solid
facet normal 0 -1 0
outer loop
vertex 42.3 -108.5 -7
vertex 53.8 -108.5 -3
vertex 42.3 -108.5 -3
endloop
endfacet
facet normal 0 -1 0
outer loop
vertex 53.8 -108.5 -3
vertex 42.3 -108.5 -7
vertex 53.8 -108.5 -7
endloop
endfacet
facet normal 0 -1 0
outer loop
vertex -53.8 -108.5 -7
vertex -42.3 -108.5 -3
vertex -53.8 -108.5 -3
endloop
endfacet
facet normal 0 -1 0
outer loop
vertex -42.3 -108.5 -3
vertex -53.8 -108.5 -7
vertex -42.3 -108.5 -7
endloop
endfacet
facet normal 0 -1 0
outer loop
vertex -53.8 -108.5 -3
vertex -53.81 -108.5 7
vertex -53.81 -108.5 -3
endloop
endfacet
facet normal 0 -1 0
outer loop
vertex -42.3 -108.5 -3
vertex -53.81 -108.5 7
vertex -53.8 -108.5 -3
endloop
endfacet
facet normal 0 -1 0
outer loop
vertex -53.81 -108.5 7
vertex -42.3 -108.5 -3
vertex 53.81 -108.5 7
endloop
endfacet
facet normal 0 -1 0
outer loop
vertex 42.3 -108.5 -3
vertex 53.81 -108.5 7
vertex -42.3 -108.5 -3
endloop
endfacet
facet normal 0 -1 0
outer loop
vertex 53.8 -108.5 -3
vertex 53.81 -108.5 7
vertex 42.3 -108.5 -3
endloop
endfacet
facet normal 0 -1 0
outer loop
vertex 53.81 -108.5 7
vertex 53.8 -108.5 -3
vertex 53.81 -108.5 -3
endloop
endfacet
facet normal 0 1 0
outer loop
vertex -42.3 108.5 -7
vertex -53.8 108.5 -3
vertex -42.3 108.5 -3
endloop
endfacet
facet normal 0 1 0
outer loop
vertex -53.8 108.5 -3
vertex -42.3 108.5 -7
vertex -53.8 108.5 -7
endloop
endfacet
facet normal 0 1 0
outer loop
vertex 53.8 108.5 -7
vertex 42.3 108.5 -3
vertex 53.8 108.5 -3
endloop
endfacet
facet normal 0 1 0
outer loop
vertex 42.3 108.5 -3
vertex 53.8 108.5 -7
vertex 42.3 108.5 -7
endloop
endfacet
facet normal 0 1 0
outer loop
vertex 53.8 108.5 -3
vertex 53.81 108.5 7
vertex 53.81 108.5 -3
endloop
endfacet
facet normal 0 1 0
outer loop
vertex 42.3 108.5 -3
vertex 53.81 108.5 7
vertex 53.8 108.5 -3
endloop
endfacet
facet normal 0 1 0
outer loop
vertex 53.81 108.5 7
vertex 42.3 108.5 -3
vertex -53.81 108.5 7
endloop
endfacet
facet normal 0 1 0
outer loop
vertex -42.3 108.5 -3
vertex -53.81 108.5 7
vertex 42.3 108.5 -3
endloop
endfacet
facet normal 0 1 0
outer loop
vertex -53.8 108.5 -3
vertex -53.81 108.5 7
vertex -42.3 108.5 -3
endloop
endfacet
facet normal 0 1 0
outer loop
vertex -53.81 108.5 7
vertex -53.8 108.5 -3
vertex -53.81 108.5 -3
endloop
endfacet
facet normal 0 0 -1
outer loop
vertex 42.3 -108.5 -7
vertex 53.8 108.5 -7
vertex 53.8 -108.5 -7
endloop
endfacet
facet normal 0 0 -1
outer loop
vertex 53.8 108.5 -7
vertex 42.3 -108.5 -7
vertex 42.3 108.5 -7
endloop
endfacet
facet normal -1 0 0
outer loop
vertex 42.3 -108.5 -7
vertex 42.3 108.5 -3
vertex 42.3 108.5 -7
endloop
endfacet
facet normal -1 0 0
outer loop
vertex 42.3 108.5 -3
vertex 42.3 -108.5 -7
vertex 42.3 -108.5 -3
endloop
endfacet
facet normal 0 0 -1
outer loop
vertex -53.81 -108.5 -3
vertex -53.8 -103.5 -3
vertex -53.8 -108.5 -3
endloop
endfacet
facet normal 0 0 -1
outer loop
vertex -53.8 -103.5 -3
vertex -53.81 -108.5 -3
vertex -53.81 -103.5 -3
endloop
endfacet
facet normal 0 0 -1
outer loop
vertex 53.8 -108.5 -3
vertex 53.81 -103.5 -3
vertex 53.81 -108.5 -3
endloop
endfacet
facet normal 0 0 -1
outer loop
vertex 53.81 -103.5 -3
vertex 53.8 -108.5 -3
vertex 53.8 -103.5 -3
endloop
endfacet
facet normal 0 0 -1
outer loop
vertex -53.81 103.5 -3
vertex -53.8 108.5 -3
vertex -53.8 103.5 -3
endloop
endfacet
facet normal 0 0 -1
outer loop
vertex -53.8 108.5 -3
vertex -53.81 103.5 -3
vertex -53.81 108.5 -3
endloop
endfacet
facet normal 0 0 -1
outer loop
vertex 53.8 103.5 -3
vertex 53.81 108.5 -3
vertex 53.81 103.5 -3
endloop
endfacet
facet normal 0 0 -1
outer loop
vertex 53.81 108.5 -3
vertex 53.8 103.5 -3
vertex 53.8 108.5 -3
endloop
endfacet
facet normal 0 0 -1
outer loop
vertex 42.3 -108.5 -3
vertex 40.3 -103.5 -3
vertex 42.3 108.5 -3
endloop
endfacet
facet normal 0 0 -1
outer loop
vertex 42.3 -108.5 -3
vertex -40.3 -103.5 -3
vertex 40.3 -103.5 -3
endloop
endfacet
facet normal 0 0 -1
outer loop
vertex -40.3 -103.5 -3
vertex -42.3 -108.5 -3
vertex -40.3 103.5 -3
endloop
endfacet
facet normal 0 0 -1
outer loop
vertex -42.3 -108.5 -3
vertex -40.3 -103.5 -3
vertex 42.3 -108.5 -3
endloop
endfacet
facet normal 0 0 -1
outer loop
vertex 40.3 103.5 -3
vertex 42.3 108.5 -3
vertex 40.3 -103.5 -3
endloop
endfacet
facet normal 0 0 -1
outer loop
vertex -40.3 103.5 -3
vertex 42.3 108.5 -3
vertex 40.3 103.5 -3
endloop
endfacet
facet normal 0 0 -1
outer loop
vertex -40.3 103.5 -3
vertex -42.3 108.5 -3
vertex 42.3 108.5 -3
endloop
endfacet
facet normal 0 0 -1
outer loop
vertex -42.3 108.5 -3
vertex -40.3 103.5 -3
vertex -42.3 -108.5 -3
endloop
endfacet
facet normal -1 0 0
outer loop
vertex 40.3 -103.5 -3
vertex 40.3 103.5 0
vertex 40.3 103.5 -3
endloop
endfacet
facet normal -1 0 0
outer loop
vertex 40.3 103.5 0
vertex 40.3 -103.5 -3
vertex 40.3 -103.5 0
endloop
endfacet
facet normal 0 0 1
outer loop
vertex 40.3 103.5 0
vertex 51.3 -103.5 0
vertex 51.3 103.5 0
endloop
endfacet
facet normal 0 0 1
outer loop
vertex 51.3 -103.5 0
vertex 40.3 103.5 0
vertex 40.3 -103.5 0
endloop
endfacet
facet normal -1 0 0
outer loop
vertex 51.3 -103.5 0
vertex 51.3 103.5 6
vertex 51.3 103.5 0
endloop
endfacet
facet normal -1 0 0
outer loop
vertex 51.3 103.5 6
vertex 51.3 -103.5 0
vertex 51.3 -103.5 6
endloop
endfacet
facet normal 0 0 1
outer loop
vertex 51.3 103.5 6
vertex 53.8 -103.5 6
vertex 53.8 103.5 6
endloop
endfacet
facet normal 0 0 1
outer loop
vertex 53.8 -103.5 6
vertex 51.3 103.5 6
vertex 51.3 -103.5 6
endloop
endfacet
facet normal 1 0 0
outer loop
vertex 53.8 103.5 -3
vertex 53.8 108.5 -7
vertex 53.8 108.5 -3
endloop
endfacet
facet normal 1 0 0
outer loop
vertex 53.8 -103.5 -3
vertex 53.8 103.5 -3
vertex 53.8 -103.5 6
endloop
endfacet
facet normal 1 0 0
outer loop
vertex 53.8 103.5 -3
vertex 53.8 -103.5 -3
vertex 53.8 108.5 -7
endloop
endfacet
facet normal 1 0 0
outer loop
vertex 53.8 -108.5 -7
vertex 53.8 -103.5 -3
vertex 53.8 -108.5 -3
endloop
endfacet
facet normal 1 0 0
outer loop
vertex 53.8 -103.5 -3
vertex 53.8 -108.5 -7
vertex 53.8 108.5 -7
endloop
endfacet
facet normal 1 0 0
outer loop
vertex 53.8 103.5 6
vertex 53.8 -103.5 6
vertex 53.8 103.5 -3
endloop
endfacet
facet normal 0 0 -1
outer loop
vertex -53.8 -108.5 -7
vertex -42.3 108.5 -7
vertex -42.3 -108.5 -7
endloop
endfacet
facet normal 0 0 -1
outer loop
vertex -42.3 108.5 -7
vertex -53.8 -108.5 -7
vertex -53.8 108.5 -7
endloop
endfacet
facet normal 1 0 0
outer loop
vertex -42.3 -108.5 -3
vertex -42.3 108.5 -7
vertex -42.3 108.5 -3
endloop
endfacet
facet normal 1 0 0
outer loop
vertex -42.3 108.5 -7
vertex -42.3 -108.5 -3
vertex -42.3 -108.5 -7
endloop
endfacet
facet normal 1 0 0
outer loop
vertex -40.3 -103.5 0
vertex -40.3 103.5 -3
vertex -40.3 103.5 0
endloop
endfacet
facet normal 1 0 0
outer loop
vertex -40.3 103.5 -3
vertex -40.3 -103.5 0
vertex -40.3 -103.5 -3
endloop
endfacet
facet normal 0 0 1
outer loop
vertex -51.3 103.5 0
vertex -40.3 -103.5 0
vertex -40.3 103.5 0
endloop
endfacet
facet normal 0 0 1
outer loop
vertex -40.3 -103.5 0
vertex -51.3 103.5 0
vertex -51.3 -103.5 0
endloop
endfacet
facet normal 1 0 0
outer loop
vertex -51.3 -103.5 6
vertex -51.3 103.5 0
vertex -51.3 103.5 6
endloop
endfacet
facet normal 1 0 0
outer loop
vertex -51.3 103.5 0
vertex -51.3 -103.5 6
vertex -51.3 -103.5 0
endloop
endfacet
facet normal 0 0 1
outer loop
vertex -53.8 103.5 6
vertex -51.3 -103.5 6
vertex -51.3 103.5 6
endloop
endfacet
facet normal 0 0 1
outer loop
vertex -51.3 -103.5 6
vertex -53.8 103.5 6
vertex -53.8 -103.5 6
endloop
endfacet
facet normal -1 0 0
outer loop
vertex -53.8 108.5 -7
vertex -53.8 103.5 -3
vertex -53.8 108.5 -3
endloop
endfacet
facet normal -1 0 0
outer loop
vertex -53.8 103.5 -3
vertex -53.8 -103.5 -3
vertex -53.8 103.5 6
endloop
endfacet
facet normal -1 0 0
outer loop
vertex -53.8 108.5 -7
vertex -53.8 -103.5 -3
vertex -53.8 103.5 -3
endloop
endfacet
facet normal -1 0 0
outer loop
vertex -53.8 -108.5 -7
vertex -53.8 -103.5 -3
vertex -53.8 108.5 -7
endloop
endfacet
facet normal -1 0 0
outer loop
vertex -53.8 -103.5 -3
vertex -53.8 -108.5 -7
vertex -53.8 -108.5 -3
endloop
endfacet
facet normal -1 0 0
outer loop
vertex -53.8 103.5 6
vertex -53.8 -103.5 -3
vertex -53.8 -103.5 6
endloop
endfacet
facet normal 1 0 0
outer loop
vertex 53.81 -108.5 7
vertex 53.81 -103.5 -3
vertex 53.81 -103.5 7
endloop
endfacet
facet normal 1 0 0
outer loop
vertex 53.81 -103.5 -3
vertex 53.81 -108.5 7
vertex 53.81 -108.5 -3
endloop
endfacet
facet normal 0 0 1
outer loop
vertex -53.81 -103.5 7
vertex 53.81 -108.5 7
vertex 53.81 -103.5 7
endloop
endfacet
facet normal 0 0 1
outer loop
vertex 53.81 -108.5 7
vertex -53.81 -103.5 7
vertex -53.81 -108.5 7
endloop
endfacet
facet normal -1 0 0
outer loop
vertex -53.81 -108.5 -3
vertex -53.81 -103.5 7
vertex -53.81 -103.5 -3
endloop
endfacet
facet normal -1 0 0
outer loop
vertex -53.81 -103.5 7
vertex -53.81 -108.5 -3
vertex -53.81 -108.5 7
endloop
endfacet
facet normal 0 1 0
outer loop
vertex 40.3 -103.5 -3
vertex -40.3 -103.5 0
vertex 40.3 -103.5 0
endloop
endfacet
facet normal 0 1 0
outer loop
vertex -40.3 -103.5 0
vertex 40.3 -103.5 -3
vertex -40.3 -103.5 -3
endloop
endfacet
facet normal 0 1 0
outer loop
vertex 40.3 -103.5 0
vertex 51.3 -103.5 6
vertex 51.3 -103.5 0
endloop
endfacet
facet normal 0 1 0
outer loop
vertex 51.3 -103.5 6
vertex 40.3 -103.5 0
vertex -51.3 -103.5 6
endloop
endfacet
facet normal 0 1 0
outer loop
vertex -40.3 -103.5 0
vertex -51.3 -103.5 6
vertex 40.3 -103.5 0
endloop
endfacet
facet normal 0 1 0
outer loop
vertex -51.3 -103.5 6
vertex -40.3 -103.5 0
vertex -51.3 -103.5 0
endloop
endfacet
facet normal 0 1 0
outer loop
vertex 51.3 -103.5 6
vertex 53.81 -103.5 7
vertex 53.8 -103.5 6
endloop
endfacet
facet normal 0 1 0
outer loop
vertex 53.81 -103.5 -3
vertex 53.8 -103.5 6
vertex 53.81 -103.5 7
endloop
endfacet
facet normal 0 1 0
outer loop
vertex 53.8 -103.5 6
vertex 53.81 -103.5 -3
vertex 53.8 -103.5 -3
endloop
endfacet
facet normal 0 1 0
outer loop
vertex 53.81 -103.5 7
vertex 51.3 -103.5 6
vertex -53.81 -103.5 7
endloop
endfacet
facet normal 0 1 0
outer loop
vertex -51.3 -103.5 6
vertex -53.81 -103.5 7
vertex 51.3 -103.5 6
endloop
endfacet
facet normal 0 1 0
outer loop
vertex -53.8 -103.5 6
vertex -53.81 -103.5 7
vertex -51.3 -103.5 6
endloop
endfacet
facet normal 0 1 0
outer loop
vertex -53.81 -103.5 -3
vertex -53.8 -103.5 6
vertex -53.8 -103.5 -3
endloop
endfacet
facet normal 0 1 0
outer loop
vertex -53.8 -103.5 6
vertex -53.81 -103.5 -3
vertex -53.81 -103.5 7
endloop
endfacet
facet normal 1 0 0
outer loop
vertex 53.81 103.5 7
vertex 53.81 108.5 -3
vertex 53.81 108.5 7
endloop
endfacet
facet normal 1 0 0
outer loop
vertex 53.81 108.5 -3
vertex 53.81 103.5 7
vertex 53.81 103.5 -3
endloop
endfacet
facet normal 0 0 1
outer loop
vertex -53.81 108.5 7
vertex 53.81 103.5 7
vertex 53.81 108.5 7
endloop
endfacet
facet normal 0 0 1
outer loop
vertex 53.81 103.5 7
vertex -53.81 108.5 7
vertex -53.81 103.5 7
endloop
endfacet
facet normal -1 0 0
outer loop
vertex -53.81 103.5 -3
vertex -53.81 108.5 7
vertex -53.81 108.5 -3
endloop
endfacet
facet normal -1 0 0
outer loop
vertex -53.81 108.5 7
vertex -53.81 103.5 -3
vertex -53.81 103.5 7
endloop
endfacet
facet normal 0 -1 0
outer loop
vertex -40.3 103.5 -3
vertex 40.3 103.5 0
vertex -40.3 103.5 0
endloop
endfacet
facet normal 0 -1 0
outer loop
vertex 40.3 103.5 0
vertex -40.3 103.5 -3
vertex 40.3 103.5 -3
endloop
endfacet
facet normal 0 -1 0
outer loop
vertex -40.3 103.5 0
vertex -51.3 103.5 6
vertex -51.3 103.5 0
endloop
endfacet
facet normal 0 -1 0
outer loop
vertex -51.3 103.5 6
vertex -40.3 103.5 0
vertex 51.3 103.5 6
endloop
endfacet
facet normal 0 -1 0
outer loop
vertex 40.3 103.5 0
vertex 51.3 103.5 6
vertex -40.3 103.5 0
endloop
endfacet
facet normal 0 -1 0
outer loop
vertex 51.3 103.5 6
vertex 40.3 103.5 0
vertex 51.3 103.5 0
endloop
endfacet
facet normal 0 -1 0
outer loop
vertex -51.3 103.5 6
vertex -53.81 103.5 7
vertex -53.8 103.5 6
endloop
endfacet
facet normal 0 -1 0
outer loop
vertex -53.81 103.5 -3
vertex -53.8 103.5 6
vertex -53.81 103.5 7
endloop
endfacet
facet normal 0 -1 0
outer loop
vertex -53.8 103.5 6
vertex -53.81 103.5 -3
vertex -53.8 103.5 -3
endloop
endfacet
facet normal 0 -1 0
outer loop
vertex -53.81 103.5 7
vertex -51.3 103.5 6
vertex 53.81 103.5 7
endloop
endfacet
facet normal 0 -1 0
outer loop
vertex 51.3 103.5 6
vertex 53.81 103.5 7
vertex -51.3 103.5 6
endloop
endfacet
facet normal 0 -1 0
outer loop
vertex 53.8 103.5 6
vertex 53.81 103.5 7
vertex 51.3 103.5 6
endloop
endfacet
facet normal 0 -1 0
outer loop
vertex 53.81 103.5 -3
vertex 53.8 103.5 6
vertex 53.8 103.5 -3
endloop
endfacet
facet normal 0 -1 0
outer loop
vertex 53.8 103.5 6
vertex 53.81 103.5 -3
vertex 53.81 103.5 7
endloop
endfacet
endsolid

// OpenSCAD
// file: ../lib/gridfinity.scad
// gridfinity.scad — shared Gridfinity baseplate + bin library (per spec).
//
// 42 mm pitch, 41.5 mm bins, baseplate socket 0.7/1.8/2.15 = 4.65 mm, 4 mm
// fillet; bin foot 0.8/1.8/2.15 = 4.75 mm, 3.75 mm corner radius. Verified the
// bin foot seats in the baseplate socket with ~0.25–0.5 mm clearance.
//
//   baseplate(nx, ny)                      — tiled receiving baseplate
//   bin_blank(nx, ny, h)                   — solid bin body (feet + block, no cavity)
//   bin(nx, ny, h, wall, floor)            — open Gridfinity bin
//   divided_bin(nx, ny, h, cols, rows, …)  — bin with internal compartments
//   lid(nx, ny, …)                         — friction lid for a bin of the same footprint
//   stack_base(nx, ny, h, …)               — baseplate-topped base; a bin socket-stacks on it

GF = 42; GF_FILLET = 4;
_C_TOP = 2.15; _C_MID = 1.8; _C_BOT = 0.7;
_BP_LIP = _C_TOP + _C_MID + _C_BOT; _BP_FLOOR = 1.2; BP_H = _BP_LIP + _BP_FLOOR;  // 5.85
BIN_SZ = 41.5; BIN_R = 3.75; BIN_BASE_H = 4.75;

// ---- baseplate ----
module _bp_cell(i = 0) { offset(r = -i) offset(r = GF_FILLET) offset(r = -GF_FILLET) square(GF, center = true); }
module _bp_socket() {
    e = 0.01;
    hull() { translate([0,0,BP_H-e]) linear_extrude(e) _bp_cell(0); translate([0,0,BP_H-_C_TOP]) linear_extrude(e) _bp_cell(_C_TOP); }
    translate([0,0,BP_H-_C_TOP-_C_MID]) linear_extrude(_C_MID) _bp_cell(_C_TOP);
    hull() { translate([0,0,BP_H-_C_TOP-_C_MID-e]) linear_extrude(e) _bp_cell(_C_TOP); translate([0,0,BP_H-_BP_LIP]) linear_extrude(e) _bp_cell(_C_TOP+_C_BOT); }
}
module baseplate(nx, ny) {
    w = nx*GF; d = ny*GF;
    difference() {
        translate([0,0,BP_H/2]) linear_extrude(BP_H, center=true) offset(GF_FILLET) offset(-GF_FILLET) square([w,d], center=true);
        for (ix=[0:nx-1], iy=[0:ny-1]) translate([(ix-(nx-1)/2)*GF, (iy-(ny-1)/2)*GF, 0]) _bp_socket();
    }
}

// ---- bin ----
module _bin_cell(i = 0) { offset(r = -i) offset(r = BIN_R) offset(r = -BIN_R) square(BIN_SZ, center = true); }
module _bin_foot() {
    e = 0.01;
    hull() { linear_extrude(e) _bin_cell(2.95); translate([0,0,0.8]) linear_extrude(e) _bin_cell(2.15); }    // bottom chamfer
    translate([0,0,0.8]) linear_extrude(1.8) _bin_cell(2.15);                                                 // vertical
    hull() { translate([0,0,2.6]) linear_extrude(e) _bin_cell(2.15); translate([0,0,BIN_BASE_H]) linear_extrude(e) _bin_cell(0); } // top chamfer
}
// Solid bin body: Gridfinity feet + the block above them, with no cavity cut.
// Cup-style bins (lib/vessel.scad) subtract their own bores from this instead of
// re-deriving the foot + shell union.
module bin_blank(nx, ny, h) {
    W = nx*GF - 0.5; D = ny*GF - 0.5;
    union() {
        for (ix=[0:nx-1], iy=[0:ny-1]) translate([(ix-(nx-1)/2)*GF, (iy-(ny-1)/2)*GF, 0]) _bin_foot();
        translate([0,0,BIN_BASE_H]) linear_extrude(h-BIN_BASE_H) offset(BIN_R) offset(-BIN_R) square([W,D], center=true);
    }
}

module _bin_shell(nx, ny, h, wall, floor) {
    W = nx*GF - 0.5; D = ny*GF - 0.5;
    difference() {
        bin_blank(nx, ny, h);
        translate([0,0,BIN_BASE_H+floor]) linear_extrude(h) offset(BIN_R-wall) offset(-(BIN_R-wall)) square([W-2*wall, D-2*wall], center=true);
    }
}
module bin(nx, ny, h, wall = 1.2, floor = 1.4) { _bin_shell(nx, ny, h, wall, floor); }

// ---- stacking base ----
// A bin whose TOP is a Gridfinity baseplate, so a standard bin socket-stacks on
// it (two-tier towers: instrument on top, cords/jig/adapters in the base). The
// base is open at the FRONT (−Y) by default so the lower item is reachable while
// the top tier stays socketed — same idea as drybox-splitter-stand's open cubby.
// The whole tower foots on the bench baseplate via this base's own foot.
//
//   h = interior height of the lower compartment (floor to the baseplate cap).
module stack_base(nx, ny, h, wall = 1.2, floor = 1.4, open_front = true) {
    W = nx*GF - 0.5; D = ny*GF - 0.5;
    z0 = BIN_BASE_H + floor;
    iw = W - 2*wall; id = D - 2*wall;
    difference() {
        union() {
            bin_blank(nx, ny, h);                    // solid foot + block to h
            translate([0,0,h]) baseplate(nx, ny);    // baseplate cap (sockets up)
        }
        // lower cavity, floor up to the cap underside
        translate([0,0,z0]) linear_extrude(h - z0 + 0.01)
            offset(BIN_R-wall) offset(-(BIN_R-wall)) square([iw, id], center=true);
        // open front: cut the −Y wall so you reach in under the cap
        if (open_front)
            translate([-iw/2, -D, z0]) cube([iw, D/2 + 0.01, h - z0 + 0.01]);
    }
}

module divided_bin(nx, ny, h, cols = 1, rows = 1, wall = 1.2, floor = 1.4, div = 1.2) {
    W = nx*GF - 0.5; D = ny*GF - 0.5;
    union() {
        bin(nx, ny, h, wall, floor);
        // internal divider walls (from the floor up to the rim)
        iw = W - 2*wall; id = D - 2*wall; z0 = BIN_BASE_H + floor;
        for (c = [1 : cols-1]) translate([-iw/2 + c*iw/cols - div/2, -id/2, z0]) cube([div, id, h - z0]);
        for (r = [1 : rows-1]) translate([-iw/2, -id/2 + r*id/rows - div/2, z0]) cube([iw, div, h - z0]);
    }
}

// ---- lid ----
// Friction lid for a bin of the same footprint: a flat plate with a skirt that
// drops into the bin's cavity. Emitted PRINT-READY — plate on the bed, skirt
// standing up — so it needs no supports. Flip it in your head to picture it
// fitted: the plate then caps the rim and the lid adds `t` to the stack height.
//
// Why lids exist here: full-extension drawer slides let small parts hop between
// compartments on a hard close, and brass inserts aren't magnetic — you can't
// sweep them back. `wall` must match the bin's wall so the skirt lands in the
// cavity; `clearance` is per-side slop between skirt and cavity.
module lid(nx, ny, t = 1.6, skirt = 4, wall = 1.2, clearance = 0.35, lid_wall = 1.6) {
    W = nx*GF - 0.5; D = ny*GF - 0.5;
    iw = W - 2*wall - 2*clearance; id = D - 2*wall - 2*clearance;   // skirt outer
    ir = BIN_R - wall;                                              // cavity corner radius
    union() {
        linear_extrude(t) offset(BIN_R) offset(-BIN_R) square([W, D], center=true);
        translate([0,0,t]) linear_extrude(skirt) difference() {
            offset(ir) offset(-ir) square([iw, id], center=true);
            offset(ir-lid_wall) offset(-(ir-lid_wall)) square([iw-2*lid_wall, id-2*lid_wall], center=true);
        }
    }
}
// main file
// engindot_frame.scad — one-piece drop-over frame for the ENGINDOT top. PRINT ONE.
//
// Part 1 of 2. The stock Clickfinity plate (engindot_plate.scad) drops into the
// inner ledge and is bonded there; bins click into the plate. Same two-part
// split as owon-spm8104-tray, for the same reason — the plate must print
// latches-UP, the frame walls-DOWN, and no single orientation suits both.
//
// NO CLAMP, NO HARDWARE. Retention is passive:
//   * front/back LIPS hook the top edges  -> cannot slide fore-aft
//   * short side SKIRTS hug the case      -> cannot slide sideways
//   * gravity                             -> holds it down
//
// The skirts are deliberately SHORT here. The ENGINDOT vents the full height of
// both sides, so a 20 mm skirt like the OWON's would sit over the intake. The
// lips carry the retention; the skirts only locate. SKIRT_D is the knob.
//
// Unlike the OWON, the plate (84 mm) is much narrower than the case (102 mm),
// so the ledge is a real shelf spanning ~9 mm each side rather than a 2 mm lip.
// LEDGE_T is thickened to suit.
//
// PRINT: as rendered — walls UP, so the frame outline sits on the bed and the
// only overhang is the inner ledge, which bridges. No supports.
include <shortkiller_common.scad>

_TOP = LEDGE_T + PLATE_T_;

// One side jaw's cross-section (x, z), inner edge outward:
//
//   * a LEDGE_IN-wide lip that catches the plate edge
//   * a solid border, full height, from the plate edge out to the case wall
//   * the short skirt down the case side
//
// The border is SOLID rather than a shelf, and that is a printability decision,
// not a styling one. The plate (84) is much narrower than the lid (102), so the
// gap between them is ~9 mm per side. Carried at ledge height that would be a
// 9 mm one-sided cantilever running the full 217 mm — printed walls-up it hangs
// in air and needs support for its whole length. Full height, it is a wall
// sitting on the bed, and the ONLY overhang left is the LEDGE_IN lip, which
// bridges exactly like the OWON's does.
//
// It is also far stiffer, which this frame wants — it spans 217 mm on 2.5 mm
// skirts.
function _jaw_profile() = [
    [POCKET_HW - LEDGE_IN,   0],
    [POCKET_HW - LEDGE_IN,   LEDGE_T],
    [POCKET_HW,              LEDGE_T],
    [POCKET_HW,              _TOP],
    [SKIRT_OUT,              _TOP],
    [SKIRT_OUT,             -SKIRT_D],
    [SKIRT_IN,              -SKIRT_D],
    [SKIRT_IN,               0],
];

module _jaw() {
    translate([0, MOUNT_L/2, 0]) rotate([90, 0, 0])
        linear_extrude(MOUNT_L) polygon(_jaw_profile());
}

// Front/back end-bar: spans the full width, fuses into BOTH jaws to close the
// frame, and carries the lip that hooks the front/back top edge. Overlapped
// into the jaws so it merges without coincident planes.
module _end_bar(s) {
    y0 = s > 0 ? MOUNT_L/2 - END_BAR_T : -MOUNT_L/2;
    // Tops out at LEDGE_T, not _TOP: the plate rests OVER the bar rather than
    // butting into it. Enclosing the plate would demand MOUNT_L >= 220 on a
    // ~216 mm lid.
    translate([-SKIRT_OUT - EPS, y0, -END_LIP_D])
        cube([2*SKIRT_OUT + 2*EPS, END_BAR_T, END_LIP_D + LEDGE_T]);
}

module frame() {
    _jaw();
    mirror([1, 0, 0]) _jaw();
    _end_bar(1);
    _end_bar(-1);
}

// Rendered WALLS-UP for printing. Flip walls-down to use it on the supply.
rotate([180, 0, 0]) frame();
